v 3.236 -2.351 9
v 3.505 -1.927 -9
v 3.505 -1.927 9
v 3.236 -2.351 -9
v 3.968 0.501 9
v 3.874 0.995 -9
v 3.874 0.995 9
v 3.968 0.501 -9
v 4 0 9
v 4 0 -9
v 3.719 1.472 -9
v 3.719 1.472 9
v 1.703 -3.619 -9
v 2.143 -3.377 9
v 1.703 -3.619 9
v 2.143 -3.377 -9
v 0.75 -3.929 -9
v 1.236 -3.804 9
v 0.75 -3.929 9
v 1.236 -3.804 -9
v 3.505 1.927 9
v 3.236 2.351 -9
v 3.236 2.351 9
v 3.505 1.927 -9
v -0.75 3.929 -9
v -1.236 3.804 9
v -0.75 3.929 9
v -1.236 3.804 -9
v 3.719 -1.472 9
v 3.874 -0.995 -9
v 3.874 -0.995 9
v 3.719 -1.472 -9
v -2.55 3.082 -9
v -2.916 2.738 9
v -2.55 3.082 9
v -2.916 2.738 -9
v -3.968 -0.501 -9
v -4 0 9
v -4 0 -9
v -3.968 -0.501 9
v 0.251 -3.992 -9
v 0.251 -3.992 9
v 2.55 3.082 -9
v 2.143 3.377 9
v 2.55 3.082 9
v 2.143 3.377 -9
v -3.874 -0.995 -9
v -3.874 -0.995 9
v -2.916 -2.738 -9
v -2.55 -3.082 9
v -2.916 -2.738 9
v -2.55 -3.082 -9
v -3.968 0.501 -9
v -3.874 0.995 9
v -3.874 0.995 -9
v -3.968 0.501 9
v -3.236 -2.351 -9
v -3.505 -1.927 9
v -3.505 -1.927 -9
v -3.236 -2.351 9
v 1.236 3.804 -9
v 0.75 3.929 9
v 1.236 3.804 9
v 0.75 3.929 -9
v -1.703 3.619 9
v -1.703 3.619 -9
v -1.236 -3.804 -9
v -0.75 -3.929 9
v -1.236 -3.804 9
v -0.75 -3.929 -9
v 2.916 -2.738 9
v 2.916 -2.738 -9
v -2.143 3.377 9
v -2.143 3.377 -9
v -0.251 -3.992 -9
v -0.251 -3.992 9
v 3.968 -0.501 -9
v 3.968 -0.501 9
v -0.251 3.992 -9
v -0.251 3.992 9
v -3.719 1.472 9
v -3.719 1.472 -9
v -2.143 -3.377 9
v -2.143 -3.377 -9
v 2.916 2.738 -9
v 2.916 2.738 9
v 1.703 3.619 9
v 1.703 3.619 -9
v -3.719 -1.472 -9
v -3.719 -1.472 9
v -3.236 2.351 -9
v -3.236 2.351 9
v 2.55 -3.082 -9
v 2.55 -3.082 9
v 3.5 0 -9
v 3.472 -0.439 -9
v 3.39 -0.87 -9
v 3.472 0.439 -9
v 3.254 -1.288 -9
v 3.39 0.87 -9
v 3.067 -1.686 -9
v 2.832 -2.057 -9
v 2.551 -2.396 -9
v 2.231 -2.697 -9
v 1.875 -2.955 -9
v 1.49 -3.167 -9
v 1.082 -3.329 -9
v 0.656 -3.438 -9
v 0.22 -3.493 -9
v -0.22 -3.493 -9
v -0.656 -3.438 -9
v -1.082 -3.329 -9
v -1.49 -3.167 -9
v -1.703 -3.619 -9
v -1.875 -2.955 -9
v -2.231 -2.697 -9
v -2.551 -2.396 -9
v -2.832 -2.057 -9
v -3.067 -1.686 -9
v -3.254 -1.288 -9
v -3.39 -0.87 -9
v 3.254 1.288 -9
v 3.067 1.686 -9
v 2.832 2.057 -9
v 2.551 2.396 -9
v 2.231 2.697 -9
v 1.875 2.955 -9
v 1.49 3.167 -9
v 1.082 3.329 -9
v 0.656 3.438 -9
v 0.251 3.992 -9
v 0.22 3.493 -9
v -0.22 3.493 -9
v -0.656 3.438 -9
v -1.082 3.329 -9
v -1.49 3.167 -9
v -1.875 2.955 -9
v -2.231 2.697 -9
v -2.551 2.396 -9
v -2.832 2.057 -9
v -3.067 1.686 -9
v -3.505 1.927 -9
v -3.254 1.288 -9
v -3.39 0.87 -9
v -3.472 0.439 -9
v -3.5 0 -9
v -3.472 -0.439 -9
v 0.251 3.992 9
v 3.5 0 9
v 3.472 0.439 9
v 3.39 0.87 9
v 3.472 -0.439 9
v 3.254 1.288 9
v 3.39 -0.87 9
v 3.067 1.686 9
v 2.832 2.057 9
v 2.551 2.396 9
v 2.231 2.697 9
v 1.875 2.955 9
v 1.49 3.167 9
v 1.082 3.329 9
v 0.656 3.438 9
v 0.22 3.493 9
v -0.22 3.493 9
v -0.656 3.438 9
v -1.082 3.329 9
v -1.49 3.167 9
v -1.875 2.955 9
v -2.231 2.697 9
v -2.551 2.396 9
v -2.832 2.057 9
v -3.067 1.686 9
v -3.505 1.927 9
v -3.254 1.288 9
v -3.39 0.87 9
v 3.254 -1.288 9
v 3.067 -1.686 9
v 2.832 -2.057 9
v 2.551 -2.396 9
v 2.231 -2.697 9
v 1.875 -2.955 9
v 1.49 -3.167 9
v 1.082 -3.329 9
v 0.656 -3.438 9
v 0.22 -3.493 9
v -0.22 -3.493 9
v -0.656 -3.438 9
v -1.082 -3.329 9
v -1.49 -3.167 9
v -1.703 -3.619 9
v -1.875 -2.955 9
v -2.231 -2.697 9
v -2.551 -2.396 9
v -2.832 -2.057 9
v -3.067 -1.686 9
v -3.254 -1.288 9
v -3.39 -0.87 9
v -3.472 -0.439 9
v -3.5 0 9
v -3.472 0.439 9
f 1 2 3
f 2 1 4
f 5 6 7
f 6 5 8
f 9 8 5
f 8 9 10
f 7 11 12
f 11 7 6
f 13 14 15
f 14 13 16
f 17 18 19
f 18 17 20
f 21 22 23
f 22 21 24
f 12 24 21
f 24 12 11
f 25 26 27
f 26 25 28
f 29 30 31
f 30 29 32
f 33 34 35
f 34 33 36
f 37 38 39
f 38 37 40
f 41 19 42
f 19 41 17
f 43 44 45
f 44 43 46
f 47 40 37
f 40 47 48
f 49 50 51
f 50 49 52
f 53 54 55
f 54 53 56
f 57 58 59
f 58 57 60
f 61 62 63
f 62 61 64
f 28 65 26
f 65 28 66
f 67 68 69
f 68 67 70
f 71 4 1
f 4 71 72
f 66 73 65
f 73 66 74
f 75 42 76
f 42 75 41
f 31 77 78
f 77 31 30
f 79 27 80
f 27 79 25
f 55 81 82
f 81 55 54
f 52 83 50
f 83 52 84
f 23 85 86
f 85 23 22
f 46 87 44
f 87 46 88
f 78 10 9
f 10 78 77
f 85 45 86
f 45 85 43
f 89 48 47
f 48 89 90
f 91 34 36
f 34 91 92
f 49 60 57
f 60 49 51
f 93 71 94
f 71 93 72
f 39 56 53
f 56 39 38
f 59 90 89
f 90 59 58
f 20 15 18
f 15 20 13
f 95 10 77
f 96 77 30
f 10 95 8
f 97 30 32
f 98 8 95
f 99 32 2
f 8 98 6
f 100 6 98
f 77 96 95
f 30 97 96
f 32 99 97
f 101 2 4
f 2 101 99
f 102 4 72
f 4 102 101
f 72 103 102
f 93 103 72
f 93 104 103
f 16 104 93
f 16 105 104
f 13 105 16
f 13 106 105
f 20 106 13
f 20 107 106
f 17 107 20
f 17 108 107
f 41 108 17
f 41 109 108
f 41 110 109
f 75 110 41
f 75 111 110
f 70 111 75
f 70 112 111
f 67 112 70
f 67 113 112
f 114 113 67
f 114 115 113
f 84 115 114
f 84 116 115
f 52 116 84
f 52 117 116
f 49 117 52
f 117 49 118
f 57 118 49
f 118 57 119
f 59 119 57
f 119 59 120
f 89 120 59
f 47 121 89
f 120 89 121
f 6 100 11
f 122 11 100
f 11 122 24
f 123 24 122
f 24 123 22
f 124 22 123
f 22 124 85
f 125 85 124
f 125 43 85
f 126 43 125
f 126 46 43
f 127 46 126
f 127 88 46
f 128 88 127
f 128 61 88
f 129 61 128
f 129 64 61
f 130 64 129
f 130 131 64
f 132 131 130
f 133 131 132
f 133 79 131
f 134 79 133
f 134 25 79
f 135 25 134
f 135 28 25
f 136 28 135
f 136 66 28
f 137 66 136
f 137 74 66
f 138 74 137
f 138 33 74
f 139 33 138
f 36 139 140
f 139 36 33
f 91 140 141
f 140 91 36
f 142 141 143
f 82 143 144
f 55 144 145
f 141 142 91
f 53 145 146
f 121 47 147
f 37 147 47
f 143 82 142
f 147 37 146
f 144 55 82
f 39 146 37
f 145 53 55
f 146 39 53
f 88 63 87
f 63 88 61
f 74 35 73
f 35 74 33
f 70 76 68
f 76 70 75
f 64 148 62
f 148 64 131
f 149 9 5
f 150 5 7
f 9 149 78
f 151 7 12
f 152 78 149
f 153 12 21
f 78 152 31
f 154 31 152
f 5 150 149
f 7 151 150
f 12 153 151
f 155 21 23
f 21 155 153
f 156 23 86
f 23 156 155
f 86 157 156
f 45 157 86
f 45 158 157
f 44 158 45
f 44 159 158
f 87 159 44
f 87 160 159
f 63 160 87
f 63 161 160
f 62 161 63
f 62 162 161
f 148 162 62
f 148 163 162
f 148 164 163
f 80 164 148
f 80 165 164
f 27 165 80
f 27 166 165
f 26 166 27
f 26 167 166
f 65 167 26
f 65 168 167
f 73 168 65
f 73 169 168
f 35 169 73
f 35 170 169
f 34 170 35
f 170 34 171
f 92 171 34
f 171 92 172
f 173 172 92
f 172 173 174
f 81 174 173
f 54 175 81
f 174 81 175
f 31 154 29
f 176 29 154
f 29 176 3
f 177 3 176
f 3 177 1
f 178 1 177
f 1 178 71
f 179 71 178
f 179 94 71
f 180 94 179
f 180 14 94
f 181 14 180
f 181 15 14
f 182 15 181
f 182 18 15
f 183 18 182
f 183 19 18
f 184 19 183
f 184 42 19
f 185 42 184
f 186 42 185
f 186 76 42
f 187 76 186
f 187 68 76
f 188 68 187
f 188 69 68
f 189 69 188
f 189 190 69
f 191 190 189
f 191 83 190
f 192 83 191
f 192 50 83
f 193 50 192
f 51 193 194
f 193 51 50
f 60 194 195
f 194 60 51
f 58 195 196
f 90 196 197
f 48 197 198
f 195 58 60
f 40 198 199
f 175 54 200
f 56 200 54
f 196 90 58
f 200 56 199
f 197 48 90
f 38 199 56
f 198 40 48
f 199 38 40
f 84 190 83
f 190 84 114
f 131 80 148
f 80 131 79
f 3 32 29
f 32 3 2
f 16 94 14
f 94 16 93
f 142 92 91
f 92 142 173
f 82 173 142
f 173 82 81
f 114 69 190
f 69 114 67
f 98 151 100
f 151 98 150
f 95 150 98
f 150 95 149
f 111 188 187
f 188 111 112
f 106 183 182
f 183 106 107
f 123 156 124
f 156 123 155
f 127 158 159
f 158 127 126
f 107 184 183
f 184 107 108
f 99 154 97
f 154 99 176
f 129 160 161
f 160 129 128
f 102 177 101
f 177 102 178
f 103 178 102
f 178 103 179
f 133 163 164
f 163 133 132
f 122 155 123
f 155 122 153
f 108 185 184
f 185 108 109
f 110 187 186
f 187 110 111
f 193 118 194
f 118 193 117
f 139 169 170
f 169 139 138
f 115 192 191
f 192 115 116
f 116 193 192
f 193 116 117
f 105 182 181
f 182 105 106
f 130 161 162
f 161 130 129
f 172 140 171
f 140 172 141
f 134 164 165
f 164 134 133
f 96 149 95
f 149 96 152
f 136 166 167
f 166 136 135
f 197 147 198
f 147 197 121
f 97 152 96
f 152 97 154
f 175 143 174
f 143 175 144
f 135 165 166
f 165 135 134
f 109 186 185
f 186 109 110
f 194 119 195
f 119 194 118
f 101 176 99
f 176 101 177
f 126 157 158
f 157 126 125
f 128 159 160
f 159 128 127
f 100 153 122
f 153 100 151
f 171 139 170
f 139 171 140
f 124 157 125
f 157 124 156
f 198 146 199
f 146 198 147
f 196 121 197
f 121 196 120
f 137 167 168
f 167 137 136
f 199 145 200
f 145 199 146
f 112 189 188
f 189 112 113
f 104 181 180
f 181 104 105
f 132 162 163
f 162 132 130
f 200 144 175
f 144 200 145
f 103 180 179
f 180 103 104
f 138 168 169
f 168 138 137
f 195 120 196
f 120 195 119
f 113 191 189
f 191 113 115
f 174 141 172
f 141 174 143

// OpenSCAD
$fn = 50;


difference() {
	union() {
		translate(v = [0, 0, -9.0000000000]) {
			cylinder(h = 18, r = 4.0000000000);
		}
	}
	union() {
		translate(v = [0, 0, -100.0000000000]) {
			cylinder(h = 200, r = 3.5000000000);
		}
	}
}
